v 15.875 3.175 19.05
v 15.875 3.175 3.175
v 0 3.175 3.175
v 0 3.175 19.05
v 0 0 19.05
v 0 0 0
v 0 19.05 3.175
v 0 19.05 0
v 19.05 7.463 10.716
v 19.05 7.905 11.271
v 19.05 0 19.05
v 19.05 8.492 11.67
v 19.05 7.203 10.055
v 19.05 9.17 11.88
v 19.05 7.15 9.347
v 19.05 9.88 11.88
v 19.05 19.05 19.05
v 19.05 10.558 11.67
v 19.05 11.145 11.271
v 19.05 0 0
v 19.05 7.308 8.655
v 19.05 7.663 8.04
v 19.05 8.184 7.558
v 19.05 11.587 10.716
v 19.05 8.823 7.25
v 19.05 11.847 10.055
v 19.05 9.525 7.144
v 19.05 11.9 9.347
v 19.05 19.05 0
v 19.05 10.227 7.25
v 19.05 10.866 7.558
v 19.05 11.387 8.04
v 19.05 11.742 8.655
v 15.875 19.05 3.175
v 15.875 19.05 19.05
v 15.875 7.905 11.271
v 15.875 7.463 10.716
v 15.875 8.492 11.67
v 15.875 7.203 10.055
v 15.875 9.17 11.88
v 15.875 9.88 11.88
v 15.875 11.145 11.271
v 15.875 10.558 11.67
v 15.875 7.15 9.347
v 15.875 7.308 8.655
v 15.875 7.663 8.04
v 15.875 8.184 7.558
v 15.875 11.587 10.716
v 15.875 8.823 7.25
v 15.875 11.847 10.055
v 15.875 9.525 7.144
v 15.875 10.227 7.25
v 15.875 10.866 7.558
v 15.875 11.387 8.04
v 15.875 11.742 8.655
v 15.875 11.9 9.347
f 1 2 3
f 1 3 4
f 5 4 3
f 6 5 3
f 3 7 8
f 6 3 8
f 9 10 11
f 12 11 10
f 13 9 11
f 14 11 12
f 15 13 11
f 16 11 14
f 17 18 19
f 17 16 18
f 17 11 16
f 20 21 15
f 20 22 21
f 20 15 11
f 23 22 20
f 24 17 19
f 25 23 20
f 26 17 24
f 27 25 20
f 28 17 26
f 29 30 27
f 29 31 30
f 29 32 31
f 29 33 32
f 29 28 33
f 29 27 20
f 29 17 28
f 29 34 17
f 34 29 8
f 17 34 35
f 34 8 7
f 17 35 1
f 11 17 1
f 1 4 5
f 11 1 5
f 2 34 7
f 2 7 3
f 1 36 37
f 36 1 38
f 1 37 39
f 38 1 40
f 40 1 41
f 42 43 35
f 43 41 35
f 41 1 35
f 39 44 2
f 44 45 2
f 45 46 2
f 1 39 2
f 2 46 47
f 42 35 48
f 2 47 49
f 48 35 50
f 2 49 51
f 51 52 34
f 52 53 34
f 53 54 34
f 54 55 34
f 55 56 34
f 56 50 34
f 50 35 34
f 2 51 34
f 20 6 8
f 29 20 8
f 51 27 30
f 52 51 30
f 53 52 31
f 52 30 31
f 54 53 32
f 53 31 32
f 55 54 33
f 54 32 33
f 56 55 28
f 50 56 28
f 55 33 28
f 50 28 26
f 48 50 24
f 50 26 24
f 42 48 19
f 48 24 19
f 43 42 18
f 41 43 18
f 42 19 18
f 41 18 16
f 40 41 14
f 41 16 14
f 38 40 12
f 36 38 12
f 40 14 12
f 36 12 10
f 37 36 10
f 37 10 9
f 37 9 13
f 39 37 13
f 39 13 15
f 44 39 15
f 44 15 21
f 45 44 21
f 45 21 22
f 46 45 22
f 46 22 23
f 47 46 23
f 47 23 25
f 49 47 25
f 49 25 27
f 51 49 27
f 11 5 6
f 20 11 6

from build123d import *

# Parameters (mm, degrees)
BOSS_EXTRUDE1_DEPTH = 19.05
SKETCH3_W           = 19.05
SKETCH3_H           = 19.05
BOSS_EXTRUDE2_DEPTH = 3.175
SKETCH4_R           = 2.38125
CUT_EXTRUDE1_DEPTH  = 33.995567884


with BuildPart() as part:
    # Sketch2 → Boss-Extrude1 (new body)
    with BuildSketch(Plane(origin=(0, 0, 0), x_dir=(0, 0, -1), z_dir=(1, 0, 0))):
        Polygon((0, 0), (0, 19.05), (-3.175, 19.05), (-3.175, 3.175), (-19.05, 3.175), (-19.05, 0), align=None)
    extrude(amount=BOSS_EXTRUDE1_DEPTH)

    # Sketch3 → Boss-Extrude2 (add)
    with BuildSketch(Plane(origin=(19.05, 0, 0), x_dir=(0, 0, -1), z_dir=(1, 0, 0))):
        with Locations((-9.525, 9.525)):
            Rectangle(SKETCH3_W, SKETCH3_H)
    extrude(amount=-BOSS_EXTRUDE2_DEPTH)

    # Sketch4 → Cut-Extrude1 (cut, through all)
    with BuildSketch(Plane(origin=(19.05, 0, 0), x_dir=(0, 0, -1), z_dir=(1, 0, 0))):
        with Locations((-9.525, 9.525)):
            Circle(SKETCH4_R)
    extrude(amount=-CUT_EXTRUDE1_DEPTH, mode=Mode.SUBTRACT)


solid = part.part
